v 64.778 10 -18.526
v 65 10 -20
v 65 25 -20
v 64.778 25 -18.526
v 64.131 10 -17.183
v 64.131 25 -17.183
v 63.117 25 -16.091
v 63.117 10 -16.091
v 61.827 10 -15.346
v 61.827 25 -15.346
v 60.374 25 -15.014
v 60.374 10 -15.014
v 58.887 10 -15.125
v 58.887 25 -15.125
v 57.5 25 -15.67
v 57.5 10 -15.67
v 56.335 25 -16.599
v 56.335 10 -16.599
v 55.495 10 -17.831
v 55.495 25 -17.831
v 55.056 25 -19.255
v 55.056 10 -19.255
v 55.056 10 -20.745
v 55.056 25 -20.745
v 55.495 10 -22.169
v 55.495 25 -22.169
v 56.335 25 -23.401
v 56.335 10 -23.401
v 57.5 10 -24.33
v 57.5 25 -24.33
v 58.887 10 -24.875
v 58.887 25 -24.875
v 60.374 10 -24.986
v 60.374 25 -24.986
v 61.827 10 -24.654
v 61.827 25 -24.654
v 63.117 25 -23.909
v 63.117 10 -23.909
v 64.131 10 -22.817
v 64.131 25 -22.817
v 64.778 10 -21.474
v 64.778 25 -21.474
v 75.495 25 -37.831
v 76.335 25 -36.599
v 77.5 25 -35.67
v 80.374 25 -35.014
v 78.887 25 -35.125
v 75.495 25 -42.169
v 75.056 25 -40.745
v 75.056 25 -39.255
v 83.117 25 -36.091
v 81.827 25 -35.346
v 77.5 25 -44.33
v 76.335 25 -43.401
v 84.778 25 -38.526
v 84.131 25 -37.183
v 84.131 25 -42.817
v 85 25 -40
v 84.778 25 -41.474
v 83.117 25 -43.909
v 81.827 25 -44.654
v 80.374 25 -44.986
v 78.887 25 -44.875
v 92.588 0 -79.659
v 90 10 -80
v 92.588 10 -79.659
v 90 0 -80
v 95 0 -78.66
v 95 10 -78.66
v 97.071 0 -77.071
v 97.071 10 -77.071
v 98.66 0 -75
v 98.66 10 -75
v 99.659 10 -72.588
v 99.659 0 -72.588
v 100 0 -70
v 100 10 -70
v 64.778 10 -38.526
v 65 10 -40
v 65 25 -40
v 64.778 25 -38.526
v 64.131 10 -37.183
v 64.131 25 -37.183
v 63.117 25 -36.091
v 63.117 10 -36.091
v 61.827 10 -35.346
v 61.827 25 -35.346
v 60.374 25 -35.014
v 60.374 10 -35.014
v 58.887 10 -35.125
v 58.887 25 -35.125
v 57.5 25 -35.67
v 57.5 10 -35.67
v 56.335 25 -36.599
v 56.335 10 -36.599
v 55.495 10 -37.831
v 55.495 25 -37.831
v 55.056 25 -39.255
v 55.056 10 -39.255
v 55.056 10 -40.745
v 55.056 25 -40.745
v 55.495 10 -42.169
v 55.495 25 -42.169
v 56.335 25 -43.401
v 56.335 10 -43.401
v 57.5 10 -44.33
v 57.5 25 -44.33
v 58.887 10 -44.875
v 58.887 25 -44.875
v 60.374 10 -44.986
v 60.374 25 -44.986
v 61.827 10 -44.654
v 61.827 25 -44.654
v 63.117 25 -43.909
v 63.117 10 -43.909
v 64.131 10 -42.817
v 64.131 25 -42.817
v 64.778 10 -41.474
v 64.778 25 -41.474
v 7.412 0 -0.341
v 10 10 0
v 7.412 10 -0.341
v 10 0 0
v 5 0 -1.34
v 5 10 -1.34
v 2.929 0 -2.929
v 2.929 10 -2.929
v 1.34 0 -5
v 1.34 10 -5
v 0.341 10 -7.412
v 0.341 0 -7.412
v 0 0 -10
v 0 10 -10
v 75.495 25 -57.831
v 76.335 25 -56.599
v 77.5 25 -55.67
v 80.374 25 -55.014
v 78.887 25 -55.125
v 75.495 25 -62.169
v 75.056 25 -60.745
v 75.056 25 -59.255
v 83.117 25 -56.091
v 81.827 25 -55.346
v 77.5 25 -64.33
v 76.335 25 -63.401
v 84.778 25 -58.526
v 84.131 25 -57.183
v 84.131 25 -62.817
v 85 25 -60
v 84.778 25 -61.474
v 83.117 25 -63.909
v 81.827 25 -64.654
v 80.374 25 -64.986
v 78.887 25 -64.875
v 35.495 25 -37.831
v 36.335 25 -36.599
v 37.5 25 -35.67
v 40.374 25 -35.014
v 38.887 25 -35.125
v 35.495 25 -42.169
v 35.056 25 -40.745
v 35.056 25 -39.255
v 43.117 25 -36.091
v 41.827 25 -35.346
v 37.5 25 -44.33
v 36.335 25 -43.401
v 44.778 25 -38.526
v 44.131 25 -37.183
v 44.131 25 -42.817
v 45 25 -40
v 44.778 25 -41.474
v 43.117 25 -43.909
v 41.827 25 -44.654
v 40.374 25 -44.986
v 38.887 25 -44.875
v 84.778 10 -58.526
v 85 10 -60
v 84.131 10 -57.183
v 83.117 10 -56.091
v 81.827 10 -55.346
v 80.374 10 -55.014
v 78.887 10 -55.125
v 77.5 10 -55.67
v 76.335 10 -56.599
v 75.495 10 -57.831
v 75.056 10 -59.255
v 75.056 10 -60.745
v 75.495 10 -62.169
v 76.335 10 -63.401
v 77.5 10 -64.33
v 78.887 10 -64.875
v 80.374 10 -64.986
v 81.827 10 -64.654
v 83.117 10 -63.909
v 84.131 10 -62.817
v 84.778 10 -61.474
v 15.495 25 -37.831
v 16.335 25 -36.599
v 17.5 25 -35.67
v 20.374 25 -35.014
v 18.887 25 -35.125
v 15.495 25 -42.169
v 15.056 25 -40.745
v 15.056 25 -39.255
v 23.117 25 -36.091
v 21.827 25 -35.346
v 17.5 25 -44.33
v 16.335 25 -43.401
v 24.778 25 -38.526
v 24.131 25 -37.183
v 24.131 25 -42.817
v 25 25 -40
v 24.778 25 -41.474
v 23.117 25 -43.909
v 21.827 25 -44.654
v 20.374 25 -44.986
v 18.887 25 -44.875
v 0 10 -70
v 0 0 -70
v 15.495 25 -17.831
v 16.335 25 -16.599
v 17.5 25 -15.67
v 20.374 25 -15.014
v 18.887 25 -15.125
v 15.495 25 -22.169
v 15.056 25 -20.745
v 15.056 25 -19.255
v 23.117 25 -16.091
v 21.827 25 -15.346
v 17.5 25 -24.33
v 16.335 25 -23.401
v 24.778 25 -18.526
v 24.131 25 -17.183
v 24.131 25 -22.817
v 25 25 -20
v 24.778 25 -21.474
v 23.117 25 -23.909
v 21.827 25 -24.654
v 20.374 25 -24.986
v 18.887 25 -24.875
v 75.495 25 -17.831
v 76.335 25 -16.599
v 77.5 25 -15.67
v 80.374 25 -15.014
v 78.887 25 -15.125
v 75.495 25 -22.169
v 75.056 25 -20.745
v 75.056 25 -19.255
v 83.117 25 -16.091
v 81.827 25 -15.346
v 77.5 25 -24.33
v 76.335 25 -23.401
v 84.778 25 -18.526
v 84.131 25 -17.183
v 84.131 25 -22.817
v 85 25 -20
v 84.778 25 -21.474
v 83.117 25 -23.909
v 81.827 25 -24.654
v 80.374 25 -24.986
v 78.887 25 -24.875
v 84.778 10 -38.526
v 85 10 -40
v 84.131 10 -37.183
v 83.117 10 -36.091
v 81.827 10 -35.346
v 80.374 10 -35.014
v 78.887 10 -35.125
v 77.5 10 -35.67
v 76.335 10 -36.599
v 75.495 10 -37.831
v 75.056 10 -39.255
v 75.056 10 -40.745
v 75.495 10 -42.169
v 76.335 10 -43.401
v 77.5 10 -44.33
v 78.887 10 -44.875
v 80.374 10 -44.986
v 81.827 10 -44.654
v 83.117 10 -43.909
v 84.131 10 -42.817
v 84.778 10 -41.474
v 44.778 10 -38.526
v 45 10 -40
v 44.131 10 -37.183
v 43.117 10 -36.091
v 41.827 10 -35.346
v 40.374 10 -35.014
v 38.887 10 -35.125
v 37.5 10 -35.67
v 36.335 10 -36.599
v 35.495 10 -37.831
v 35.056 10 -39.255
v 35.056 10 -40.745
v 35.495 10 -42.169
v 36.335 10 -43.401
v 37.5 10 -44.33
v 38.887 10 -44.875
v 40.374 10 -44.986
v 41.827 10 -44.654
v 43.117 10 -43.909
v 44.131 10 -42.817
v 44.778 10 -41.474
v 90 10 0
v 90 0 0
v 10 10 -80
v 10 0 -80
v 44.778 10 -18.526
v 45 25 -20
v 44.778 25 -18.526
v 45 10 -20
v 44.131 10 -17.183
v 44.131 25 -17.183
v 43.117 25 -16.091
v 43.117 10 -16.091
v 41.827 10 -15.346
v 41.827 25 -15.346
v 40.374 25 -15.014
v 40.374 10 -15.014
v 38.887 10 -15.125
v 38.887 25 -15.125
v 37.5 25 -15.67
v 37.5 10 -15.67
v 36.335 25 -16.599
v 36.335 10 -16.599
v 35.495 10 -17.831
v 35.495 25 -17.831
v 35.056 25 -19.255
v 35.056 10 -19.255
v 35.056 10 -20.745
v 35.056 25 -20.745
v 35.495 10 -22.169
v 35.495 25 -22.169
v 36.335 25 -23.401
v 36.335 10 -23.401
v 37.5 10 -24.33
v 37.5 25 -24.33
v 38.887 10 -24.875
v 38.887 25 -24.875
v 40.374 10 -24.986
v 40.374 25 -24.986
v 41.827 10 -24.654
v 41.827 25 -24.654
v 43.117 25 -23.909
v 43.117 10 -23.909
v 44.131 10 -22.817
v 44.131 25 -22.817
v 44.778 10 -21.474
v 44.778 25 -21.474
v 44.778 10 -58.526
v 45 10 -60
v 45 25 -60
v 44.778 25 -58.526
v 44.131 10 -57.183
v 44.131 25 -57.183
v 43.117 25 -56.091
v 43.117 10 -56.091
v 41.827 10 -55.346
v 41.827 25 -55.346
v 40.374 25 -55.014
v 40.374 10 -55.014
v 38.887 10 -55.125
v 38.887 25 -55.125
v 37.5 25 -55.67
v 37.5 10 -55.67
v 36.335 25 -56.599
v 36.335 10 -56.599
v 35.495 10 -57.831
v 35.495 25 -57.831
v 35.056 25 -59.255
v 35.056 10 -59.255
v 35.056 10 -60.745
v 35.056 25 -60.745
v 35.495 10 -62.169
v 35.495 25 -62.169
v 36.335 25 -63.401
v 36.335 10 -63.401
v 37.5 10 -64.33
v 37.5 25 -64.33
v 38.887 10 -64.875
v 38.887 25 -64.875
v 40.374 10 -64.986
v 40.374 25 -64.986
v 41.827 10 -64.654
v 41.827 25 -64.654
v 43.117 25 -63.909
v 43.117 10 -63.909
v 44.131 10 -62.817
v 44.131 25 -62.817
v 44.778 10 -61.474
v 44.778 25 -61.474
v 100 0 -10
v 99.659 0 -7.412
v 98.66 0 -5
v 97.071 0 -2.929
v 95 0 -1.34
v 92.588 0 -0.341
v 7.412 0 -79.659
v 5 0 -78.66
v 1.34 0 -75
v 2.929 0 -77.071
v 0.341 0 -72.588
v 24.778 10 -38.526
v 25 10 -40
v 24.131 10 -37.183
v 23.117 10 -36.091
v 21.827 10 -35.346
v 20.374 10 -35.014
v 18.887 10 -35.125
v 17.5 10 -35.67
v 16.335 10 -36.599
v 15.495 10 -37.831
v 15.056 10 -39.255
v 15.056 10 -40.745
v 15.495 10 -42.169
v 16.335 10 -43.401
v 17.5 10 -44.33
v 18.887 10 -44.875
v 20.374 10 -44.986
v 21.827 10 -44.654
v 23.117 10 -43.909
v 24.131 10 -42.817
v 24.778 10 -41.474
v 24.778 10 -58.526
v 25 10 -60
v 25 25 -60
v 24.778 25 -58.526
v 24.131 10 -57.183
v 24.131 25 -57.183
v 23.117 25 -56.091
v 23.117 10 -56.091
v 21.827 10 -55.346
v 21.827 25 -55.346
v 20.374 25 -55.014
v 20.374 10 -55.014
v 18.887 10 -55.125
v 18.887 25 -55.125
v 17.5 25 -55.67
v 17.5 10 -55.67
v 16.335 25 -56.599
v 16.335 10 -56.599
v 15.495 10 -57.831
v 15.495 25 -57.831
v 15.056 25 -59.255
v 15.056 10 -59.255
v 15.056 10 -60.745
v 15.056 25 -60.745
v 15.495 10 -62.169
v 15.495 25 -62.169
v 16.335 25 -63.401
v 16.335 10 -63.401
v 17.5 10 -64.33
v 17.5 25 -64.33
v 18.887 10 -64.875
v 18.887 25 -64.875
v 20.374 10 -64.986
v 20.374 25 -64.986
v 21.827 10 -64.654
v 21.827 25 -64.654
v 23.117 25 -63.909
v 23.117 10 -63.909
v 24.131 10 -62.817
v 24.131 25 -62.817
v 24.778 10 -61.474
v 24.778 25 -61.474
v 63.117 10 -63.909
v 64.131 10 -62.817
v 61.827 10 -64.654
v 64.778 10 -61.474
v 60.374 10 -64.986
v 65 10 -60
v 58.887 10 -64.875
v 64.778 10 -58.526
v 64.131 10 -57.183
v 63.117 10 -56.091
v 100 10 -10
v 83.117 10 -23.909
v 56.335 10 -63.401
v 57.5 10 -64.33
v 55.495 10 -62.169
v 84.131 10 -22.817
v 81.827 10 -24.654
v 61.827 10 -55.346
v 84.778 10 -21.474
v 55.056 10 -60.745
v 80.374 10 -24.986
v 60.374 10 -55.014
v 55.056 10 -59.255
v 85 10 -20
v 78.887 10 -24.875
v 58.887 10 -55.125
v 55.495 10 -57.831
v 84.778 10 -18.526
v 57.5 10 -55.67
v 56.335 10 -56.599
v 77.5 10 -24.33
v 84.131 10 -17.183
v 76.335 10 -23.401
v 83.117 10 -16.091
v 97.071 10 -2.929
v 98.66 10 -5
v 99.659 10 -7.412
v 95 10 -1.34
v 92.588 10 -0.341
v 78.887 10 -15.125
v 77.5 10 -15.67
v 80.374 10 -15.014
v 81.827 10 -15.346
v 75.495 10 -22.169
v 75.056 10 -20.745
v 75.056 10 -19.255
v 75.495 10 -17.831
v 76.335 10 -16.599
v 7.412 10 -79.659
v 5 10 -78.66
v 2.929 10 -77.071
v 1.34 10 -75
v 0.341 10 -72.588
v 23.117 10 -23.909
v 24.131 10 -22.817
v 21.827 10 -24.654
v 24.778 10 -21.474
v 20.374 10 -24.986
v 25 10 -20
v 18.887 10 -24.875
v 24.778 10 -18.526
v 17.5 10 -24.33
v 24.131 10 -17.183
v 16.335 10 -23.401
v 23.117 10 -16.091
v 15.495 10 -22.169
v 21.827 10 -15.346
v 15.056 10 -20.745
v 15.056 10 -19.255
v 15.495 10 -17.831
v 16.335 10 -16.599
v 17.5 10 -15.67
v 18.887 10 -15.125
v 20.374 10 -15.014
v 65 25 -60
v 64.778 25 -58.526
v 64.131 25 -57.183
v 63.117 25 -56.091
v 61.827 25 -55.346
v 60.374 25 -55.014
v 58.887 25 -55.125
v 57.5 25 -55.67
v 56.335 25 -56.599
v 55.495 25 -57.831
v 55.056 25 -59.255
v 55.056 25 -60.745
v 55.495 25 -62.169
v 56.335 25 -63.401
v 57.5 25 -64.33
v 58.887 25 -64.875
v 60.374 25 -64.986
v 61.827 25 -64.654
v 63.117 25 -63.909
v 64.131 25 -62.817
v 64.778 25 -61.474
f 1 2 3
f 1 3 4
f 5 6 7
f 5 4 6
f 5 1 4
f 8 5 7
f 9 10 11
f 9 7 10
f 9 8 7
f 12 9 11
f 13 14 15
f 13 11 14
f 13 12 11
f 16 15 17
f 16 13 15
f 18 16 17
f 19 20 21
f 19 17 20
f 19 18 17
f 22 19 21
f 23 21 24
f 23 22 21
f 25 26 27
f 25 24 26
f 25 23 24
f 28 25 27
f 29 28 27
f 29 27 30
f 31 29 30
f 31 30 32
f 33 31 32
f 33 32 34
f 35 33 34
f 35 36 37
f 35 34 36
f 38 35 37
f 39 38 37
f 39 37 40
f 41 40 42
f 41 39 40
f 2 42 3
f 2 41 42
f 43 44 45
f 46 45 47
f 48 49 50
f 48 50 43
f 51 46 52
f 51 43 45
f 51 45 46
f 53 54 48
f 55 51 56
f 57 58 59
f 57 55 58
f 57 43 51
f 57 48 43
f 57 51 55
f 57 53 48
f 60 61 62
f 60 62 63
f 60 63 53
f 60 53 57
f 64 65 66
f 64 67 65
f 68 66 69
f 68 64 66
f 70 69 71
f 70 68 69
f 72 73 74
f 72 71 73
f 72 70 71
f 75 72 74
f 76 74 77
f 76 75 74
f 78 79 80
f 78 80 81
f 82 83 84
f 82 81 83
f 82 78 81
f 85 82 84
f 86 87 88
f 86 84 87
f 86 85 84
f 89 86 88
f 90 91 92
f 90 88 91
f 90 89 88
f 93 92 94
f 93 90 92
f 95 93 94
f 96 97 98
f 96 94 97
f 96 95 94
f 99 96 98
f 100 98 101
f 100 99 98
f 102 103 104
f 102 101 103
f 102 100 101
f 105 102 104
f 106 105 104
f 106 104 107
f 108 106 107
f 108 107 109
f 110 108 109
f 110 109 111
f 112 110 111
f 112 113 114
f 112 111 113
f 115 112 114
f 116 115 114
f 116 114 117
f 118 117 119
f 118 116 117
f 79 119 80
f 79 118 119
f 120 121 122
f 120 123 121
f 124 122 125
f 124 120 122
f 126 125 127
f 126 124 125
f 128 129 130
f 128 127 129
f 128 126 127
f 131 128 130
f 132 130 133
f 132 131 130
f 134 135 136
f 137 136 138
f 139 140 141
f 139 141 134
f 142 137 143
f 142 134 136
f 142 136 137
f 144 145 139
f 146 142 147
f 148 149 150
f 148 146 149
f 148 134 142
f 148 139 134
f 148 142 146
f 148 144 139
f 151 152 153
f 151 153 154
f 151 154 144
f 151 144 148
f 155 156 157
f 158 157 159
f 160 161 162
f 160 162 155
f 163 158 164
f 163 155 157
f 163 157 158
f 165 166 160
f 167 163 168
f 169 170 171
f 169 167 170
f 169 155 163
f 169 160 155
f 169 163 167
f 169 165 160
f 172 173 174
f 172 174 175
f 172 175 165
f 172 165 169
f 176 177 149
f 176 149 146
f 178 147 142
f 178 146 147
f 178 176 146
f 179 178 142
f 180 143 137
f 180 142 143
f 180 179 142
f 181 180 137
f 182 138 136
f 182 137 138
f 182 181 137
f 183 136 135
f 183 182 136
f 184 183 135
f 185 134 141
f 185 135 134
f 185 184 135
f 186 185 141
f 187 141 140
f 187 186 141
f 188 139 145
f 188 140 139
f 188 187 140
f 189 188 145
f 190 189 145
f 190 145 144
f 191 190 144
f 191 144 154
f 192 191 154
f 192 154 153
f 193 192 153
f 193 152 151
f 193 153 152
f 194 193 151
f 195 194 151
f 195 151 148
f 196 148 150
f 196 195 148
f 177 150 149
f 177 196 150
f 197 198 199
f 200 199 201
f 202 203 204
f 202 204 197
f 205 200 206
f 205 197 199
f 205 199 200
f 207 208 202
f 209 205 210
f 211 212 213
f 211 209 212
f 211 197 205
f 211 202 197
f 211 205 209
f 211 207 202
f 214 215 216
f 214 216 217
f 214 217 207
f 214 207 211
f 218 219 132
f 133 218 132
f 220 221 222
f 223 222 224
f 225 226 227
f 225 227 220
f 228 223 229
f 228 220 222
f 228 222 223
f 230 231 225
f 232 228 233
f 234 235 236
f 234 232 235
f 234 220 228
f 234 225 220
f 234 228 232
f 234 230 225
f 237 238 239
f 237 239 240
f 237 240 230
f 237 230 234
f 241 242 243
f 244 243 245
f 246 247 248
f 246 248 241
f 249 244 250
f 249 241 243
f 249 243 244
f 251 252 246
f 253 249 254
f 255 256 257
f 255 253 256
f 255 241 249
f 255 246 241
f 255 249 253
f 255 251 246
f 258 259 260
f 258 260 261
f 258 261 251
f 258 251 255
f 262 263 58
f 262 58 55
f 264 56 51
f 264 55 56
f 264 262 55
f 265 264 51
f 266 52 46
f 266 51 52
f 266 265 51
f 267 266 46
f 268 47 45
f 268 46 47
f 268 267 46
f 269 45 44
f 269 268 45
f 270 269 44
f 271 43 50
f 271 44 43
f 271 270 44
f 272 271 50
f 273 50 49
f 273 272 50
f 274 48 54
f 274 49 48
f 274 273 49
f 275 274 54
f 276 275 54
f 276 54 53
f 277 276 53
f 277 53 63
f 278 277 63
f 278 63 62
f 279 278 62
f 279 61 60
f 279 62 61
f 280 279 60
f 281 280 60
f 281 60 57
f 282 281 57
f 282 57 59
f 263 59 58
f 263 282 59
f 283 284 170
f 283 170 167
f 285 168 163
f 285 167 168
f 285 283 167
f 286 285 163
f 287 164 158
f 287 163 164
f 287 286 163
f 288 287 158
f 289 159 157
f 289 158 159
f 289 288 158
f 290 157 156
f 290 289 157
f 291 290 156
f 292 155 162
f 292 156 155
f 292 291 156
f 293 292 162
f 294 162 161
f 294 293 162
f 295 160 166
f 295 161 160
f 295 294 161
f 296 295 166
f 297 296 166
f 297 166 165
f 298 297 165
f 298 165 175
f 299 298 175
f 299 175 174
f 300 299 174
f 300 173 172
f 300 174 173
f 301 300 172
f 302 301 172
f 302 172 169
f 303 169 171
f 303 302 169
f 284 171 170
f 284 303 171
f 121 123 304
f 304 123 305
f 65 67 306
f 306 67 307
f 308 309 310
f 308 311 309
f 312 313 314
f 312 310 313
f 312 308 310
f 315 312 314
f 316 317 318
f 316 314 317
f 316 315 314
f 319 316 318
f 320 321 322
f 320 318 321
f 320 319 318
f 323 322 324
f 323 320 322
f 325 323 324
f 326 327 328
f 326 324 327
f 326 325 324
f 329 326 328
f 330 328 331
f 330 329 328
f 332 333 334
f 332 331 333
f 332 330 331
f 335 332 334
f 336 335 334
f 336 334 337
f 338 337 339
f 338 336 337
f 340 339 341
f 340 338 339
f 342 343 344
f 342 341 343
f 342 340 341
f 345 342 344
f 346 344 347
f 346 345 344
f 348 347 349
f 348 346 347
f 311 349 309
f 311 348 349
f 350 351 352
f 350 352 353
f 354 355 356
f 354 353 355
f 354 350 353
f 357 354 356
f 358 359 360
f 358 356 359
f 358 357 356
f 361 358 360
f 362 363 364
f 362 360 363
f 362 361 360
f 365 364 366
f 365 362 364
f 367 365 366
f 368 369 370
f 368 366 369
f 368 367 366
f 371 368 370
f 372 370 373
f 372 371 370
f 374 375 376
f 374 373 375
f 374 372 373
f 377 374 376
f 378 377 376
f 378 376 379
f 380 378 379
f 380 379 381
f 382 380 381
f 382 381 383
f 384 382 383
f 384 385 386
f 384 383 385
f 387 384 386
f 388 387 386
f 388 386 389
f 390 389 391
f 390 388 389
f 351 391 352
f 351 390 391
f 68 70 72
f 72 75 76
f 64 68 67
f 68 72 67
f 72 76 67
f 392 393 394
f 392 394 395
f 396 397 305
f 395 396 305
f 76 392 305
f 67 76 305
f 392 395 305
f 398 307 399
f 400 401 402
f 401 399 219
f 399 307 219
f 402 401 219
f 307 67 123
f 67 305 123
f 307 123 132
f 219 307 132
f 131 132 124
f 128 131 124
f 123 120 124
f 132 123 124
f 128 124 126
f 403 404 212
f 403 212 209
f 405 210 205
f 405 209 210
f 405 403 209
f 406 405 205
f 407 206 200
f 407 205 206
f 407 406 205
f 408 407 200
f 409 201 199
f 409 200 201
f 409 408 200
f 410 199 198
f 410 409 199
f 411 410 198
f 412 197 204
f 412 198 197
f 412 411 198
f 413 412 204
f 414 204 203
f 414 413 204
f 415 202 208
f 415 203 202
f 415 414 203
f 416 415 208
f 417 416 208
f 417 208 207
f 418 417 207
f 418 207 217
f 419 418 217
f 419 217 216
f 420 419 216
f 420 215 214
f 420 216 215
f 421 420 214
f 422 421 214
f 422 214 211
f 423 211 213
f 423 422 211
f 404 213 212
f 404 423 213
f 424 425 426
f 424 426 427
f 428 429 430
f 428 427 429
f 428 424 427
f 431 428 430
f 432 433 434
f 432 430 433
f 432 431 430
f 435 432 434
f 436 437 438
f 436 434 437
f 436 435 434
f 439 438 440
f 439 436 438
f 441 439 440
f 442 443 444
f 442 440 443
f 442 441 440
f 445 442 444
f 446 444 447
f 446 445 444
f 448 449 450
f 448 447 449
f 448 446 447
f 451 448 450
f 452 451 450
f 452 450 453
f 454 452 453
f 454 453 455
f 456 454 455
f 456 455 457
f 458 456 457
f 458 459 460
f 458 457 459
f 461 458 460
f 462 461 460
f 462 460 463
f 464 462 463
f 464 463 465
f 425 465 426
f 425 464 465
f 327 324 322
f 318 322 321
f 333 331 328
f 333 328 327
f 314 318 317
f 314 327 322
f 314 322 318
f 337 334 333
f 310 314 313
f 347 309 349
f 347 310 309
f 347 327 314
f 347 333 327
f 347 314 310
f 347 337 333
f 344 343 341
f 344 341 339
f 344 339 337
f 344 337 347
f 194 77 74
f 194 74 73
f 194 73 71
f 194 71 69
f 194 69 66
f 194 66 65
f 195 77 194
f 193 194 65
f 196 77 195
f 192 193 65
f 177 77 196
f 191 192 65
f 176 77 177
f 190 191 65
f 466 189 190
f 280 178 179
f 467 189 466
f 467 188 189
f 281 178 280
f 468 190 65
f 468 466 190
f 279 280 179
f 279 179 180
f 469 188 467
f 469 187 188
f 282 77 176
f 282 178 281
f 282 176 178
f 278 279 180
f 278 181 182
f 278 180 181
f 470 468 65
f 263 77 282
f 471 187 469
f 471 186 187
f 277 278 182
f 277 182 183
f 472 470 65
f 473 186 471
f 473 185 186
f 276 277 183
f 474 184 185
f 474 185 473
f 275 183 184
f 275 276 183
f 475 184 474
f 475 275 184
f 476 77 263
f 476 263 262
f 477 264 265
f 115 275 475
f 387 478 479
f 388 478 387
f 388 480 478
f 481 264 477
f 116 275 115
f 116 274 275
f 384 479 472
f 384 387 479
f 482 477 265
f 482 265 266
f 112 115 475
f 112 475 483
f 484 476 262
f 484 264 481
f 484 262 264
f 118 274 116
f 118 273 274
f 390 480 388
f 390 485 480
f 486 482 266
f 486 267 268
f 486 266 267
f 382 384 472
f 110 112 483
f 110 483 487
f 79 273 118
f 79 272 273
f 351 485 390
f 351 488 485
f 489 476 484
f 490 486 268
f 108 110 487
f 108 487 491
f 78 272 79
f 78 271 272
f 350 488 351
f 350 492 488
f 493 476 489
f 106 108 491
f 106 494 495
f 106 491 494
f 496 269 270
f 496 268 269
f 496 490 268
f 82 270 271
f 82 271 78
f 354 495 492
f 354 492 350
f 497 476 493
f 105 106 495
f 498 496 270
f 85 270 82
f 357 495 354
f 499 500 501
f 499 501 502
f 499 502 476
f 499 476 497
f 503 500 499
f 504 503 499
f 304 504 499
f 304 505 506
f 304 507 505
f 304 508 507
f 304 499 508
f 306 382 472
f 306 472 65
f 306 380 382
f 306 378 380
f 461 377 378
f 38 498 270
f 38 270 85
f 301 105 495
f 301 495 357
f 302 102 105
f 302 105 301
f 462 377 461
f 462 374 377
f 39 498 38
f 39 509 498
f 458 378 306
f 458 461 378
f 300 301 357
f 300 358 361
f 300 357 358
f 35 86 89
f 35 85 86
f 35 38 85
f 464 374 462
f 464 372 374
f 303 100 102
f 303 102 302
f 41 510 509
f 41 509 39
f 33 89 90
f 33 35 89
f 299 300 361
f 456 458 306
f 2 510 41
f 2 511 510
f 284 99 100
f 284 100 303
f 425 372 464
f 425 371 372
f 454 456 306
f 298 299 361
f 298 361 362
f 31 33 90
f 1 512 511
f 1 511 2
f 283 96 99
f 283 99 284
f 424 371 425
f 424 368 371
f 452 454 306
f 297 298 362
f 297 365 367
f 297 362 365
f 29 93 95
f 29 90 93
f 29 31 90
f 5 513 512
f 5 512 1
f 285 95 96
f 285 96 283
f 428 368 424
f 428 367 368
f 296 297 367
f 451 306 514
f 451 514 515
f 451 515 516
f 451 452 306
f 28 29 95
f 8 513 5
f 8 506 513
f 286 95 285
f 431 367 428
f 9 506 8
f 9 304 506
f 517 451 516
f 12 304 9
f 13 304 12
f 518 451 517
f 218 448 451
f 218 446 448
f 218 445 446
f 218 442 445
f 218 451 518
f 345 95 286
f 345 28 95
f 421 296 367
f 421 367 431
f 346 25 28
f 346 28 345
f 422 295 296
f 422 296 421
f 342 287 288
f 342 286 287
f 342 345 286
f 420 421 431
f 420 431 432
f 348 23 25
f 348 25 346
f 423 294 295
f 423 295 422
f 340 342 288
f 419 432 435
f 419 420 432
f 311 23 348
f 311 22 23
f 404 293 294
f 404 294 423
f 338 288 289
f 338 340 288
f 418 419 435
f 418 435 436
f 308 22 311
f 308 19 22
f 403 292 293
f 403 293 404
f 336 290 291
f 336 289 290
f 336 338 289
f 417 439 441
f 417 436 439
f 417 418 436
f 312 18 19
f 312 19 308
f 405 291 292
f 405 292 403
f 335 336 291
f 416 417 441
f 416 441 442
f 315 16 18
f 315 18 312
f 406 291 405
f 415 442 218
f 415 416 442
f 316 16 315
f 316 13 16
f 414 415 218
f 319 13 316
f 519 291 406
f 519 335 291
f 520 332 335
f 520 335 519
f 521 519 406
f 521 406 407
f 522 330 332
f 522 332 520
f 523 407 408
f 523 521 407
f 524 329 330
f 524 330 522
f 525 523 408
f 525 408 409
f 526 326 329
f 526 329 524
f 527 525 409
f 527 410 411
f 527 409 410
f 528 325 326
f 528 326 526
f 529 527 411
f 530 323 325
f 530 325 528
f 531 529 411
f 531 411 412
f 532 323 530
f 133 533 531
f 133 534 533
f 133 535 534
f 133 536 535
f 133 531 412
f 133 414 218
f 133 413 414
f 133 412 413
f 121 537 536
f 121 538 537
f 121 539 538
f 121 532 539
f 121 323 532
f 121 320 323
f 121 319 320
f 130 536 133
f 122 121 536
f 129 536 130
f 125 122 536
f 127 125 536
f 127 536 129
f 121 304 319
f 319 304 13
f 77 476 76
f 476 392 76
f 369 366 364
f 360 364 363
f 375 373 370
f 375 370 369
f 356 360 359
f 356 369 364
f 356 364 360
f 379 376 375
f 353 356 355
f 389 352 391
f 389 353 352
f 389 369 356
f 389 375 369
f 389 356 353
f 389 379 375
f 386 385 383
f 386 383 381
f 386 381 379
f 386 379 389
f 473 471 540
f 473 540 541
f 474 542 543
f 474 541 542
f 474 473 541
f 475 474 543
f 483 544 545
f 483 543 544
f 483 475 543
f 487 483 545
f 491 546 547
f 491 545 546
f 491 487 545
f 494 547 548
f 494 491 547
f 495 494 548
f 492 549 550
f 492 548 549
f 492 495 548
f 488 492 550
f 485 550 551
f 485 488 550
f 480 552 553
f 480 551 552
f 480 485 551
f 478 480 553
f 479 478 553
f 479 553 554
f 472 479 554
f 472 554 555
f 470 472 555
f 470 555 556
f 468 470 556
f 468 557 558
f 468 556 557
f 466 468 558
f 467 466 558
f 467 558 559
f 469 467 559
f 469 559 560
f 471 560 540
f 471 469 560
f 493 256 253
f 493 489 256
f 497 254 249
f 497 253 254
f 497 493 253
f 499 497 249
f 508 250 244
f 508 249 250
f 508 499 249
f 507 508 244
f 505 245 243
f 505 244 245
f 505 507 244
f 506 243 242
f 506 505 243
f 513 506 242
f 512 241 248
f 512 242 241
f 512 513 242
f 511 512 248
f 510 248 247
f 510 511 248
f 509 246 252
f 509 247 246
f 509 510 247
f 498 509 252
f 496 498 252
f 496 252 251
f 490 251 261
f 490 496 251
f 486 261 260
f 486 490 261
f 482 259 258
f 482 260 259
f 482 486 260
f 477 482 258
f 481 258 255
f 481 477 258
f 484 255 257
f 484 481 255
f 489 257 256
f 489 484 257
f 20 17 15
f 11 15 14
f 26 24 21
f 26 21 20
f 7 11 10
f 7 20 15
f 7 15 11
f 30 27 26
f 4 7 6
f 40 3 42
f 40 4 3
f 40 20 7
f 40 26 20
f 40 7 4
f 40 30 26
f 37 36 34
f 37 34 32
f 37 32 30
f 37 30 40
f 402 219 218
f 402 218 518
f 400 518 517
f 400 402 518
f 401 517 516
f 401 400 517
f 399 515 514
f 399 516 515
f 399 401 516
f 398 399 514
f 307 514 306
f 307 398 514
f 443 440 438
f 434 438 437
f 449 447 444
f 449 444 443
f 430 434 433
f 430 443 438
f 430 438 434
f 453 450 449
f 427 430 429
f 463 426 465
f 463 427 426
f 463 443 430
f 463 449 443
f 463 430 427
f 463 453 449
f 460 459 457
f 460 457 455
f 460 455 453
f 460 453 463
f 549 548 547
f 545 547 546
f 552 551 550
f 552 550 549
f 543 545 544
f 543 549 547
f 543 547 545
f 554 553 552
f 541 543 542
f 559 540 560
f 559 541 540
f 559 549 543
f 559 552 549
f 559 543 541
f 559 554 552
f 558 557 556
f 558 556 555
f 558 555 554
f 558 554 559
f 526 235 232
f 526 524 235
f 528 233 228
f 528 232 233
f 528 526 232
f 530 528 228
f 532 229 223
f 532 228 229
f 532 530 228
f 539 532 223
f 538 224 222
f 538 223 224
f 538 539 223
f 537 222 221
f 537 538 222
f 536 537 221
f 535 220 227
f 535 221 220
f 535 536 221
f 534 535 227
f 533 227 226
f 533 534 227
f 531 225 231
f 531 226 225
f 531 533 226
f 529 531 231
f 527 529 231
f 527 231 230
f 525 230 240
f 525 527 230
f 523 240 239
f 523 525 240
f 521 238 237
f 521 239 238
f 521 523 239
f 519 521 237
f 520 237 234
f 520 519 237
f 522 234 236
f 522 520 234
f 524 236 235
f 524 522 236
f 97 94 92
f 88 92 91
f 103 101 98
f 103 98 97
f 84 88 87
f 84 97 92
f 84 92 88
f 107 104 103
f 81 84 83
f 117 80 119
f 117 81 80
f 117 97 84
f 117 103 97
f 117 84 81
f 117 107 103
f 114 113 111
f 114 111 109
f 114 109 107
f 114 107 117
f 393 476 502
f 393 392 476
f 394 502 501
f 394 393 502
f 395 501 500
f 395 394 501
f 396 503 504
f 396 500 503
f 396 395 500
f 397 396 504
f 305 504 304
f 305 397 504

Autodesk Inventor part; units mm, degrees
ref_plane "YZ Plane" through (0, 0, 0) normal (1, 0, 0) x (0, 1, 0)
ref_plane "XZ Plane" through (0, 0, 0) normal (0, 1, 0) x (-1, 0, 0)
ref_plane "XY Plane" through (0, 0, 0) normal (0, 0, 1) x (1, 0, 0)
sketch "草圖1" plane through (0, 0, 0) normal (0, 1, 0) x (-1, 0, 0)
  line L0 (-10, 0) -> (-90, 0)
  line L1 (-100, -10) -> (-100, -70)
  line L2 (-90, -80) -> (-10, -80)
  line L3 (0, -70) -> (0, -10)
  arc A0 (-90, 0) -> (-100, -10) centre (-90, -10) ccw
  arc A1 (-100, -70) -> (-90, -80) centre (-90, -70) ccw
  arc A2 (-10, -80) -> (0, -70) centre (-10, -70) ccw
  arc A3 (0, -10) -> (-10, 0) centre (-10, -10) ccw
  point P0 (0, 0)
  point P1 (-100, 0)
  point P2 (0, -80)
  dimension "d0" = 100
  dimension "d1" = 80
  dimension "d2" = 10
extrude "擠出1" add sketch "草圖1" along normal blind 10
sketch "草圖2" plane through (0, 10, 0) normal (0, 1, 0) x (1, 0, 0)
  circle A0 centre (80, 20) radius 5
  line L0 (100, 10) -> (100, 70) projected
  line L1 (10, 0) -> (90, 0) projected
  point P0 (0, 0)
  dimension "d5" = 20
  dimension "d6" = 20
  dimension "d7" = 10
extrude "擠出2" add sketch "草圖2" along normal blind 15
pattern_linear "矩形陣列1" count 4 spacing 20 along (-1, 0, 0) count 3 spacing 20 along (0, 0, -1) of "擠出2"
properties part number "練習二"
